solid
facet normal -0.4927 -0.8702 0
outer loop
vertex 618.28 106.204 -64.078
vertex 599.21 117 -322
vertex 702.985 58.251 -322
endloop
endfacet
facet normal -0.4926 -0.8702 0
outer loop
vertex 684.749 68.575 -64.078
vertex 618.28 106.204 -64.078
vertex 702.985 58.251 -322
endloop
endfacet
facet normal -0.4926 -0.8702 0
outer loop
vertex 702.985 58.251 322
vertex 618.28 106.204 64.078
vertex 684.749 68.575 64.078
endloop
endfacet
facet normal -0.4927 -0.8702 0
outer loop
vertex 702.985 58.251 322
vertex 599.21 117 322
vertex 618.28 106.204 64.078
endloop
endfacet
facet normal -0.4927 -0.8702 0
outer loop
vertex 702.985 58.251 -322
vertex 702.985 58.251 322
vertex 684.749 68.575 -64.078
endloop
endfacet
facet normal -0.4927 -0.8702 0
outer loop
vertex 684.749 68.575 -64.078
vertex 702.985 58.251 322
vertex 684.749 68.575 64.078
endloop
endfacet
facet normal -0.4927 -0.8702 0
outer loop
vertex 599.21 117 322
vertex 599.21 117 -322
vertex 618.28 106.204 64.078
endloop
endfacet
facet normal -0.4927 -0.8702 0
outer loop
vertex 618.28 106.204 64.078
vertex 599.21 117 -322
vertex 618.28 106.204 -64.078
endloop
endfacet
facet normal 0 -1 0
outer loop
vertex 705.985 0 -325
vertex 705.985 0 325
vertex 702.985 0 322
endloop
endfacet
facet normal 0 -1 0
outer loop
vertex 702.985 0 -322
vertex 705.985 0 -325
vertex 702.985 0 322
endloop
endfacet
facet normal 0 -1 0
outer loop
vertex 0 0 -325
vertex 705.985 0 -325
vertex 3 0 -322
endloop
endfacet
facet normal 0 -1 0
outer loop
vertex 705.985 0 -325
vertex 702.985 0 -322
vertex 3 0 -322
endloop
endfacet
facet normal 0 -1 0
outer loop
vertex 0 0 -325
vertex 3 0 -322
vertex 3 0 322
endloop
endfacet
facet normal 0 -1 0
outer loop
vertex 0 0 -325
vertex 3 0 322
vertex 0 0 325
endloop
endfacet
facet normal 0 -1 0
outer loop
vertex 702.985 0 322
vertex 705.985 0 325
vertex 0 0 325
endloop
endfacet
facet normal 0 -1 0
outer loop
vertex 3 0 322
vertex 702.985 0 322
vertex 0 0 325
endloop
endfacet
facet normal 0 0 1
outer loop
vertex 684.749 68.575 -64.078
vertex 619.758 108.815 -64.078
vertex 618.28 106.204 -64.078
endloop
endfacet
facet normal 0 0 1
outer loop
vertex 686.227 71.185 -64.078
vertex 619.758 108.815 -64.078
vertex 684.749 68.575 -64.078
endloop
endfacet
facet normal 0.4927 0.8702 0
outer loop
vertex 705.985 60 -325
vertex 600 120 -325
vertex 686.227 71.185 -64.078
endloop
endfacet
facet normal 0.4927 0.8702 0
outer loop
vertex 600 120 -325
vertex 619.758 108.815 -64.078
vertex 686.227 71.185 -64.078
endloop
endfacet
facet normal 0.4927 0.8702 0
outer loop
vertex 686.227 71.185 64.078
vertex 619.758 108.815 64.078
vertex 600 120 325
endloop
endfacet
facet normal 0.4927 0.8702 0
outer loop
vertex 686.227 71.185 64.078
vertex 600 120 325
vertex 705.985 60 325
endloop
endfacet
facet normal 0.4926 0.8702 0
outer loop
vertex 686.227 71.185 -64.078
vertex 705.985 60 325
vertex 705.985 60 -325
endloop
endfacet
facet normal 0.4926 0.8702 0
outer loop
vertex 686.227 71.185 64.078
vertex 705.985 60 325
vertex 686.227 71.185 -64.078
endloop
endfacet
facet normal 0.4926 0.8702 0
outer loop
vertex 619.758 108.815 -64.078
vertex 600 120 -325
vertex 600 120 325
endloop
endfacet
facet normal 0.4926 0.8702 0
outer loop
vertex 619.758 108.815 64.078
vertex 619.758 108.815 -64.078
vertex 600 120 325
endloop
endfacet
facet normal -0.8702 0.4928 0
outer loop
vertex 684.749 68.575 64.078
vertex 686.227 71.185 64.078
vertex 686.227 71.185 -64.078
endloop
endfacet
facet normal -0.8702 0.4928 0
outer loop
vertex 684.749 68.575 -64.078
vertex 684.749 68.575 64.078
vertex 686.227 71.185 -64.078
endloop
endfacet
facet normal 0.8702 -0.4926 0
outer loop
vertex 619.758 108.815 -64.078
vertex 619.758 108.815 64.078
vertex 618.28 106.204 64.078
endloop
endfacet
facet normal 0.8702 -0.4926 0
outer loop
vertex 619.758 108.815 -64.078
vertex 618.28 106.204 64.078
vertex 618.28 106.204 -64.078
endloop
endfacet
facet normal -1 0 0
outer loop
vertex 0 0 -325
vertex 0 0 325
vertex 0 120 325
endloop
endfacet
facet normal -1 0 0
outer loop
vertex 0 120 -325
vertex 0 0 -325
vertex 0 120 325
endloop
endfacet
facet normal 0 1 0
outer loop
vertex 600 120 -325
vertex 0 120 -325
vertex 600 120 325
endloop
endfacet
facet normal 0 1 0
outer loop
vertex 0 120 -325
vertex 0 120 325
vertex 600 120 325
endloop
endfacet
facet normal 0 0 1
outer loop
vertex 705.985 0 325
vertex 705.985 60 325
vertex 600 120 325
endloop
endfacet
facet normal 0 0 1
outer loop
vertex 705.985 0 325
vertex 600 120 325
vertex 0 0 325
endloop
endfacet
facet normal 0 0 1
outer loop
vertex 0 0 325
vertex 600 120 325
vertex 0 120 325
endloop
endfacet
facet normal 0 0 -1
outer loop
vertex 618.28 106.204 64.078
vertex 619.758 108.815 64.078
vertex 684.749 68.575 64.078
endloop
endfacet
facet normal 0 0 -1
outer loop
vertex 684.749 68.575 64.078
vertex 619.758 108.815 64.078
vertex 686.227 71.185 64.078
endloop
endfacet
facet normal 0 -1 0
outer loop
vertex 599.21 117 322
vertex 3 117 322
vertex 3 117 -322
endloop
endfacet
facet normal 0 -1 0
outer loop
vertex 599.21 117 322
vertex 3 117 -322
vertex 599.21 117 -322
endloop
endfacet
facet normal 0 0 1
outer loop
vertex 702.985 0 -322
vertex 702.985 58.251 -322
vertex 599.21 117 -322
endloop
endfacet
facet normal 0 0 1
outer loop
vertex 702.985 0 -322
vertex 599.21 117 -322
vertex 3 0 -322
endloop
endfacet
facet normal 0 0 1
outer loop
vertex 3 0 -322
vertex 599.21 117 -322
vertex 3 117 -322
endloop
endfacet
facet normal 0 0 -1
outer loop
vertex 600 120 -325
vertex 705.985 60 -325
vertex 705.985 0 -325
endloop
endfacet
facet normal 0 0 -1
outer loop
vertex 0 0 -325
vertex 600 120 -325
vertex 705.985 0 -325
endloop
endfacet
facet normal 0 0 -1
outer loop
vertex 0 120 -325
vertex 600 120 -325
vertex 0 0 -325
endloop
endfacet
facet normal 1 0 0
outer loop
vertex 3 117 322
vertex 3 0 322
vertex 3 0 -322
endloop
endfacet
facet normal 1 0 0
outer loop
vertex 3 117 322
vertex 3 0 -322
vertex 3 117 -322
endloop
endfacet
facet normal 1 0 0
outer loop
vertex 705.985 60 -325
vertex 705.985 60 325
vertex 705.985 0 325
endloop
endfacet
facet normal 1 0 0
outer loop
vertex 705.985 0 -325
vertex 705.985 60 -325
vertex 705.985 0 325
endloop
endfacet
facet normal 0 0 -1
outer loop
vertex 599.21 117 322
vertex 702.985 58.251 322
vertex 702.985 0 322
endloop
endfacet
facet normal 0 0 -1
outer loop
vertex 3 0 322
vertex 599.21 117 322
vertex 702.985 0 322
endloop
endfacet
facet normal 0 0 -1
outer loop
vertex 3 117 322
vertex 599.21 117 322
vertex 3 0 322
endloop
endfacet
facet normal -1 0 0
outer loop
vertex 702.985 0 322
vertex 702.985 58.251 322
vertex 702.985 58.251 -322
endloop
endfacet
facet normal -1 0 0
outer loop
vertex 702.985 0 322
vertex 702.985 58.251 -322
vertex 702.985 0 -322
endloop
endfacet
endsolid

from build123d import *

# Parameters (mm, degrees)
SALIENTE_EXTRUIR1_DEPTH = 325
VACIADO1_T              = -3
CROQUIS2_W              = 76.381162613
CROQUIS2_H              = 128.156475552
CORTAR_EXTRUIR1_DEPTH   = 697.992520796


with BuildPart() as part:
    # Croquis1 → Saliente-Extruir1 (new, symmetric)
    with BuildSketch(Plane.XY):
        Polygon((0, 0), (0, 120), (600, 120), (705.985097206, 60), (705.985097206, 0), align=None)
    extrude(amount=SALIENTE_EXTRUIR1_DEPTH, both=True)

    # Vaciado1
    vaciado1_openings = [part.faces().sort_by_distance(p)[0] for p in [
        (352.992548603, 0, 0),
    ]]
    offset(amount=VACIADO1_T, openings=vaciado1_openings, kind=Kind.INTERSECTION)

    # Croquis2 → Cortar-Extruir1 (cut, through all)
    with BuildSketch(Plane(origin=(197.068972386, 348.106236577, 0), x_dir=(0.8702271613704161, -0.4926506750357577, 0), z_dir=(0.4926506750357577, 0.8702271613704161, 0))):
        with Locations((523.913291213, 0)):
            Rectangle(CROQUIS2_W, CROQUIS2_H)
    extrude(amount=-CORTAR_EXTRUIR1_DEPTH, mode=Mode.SUBTRACT)


solid = part.part
